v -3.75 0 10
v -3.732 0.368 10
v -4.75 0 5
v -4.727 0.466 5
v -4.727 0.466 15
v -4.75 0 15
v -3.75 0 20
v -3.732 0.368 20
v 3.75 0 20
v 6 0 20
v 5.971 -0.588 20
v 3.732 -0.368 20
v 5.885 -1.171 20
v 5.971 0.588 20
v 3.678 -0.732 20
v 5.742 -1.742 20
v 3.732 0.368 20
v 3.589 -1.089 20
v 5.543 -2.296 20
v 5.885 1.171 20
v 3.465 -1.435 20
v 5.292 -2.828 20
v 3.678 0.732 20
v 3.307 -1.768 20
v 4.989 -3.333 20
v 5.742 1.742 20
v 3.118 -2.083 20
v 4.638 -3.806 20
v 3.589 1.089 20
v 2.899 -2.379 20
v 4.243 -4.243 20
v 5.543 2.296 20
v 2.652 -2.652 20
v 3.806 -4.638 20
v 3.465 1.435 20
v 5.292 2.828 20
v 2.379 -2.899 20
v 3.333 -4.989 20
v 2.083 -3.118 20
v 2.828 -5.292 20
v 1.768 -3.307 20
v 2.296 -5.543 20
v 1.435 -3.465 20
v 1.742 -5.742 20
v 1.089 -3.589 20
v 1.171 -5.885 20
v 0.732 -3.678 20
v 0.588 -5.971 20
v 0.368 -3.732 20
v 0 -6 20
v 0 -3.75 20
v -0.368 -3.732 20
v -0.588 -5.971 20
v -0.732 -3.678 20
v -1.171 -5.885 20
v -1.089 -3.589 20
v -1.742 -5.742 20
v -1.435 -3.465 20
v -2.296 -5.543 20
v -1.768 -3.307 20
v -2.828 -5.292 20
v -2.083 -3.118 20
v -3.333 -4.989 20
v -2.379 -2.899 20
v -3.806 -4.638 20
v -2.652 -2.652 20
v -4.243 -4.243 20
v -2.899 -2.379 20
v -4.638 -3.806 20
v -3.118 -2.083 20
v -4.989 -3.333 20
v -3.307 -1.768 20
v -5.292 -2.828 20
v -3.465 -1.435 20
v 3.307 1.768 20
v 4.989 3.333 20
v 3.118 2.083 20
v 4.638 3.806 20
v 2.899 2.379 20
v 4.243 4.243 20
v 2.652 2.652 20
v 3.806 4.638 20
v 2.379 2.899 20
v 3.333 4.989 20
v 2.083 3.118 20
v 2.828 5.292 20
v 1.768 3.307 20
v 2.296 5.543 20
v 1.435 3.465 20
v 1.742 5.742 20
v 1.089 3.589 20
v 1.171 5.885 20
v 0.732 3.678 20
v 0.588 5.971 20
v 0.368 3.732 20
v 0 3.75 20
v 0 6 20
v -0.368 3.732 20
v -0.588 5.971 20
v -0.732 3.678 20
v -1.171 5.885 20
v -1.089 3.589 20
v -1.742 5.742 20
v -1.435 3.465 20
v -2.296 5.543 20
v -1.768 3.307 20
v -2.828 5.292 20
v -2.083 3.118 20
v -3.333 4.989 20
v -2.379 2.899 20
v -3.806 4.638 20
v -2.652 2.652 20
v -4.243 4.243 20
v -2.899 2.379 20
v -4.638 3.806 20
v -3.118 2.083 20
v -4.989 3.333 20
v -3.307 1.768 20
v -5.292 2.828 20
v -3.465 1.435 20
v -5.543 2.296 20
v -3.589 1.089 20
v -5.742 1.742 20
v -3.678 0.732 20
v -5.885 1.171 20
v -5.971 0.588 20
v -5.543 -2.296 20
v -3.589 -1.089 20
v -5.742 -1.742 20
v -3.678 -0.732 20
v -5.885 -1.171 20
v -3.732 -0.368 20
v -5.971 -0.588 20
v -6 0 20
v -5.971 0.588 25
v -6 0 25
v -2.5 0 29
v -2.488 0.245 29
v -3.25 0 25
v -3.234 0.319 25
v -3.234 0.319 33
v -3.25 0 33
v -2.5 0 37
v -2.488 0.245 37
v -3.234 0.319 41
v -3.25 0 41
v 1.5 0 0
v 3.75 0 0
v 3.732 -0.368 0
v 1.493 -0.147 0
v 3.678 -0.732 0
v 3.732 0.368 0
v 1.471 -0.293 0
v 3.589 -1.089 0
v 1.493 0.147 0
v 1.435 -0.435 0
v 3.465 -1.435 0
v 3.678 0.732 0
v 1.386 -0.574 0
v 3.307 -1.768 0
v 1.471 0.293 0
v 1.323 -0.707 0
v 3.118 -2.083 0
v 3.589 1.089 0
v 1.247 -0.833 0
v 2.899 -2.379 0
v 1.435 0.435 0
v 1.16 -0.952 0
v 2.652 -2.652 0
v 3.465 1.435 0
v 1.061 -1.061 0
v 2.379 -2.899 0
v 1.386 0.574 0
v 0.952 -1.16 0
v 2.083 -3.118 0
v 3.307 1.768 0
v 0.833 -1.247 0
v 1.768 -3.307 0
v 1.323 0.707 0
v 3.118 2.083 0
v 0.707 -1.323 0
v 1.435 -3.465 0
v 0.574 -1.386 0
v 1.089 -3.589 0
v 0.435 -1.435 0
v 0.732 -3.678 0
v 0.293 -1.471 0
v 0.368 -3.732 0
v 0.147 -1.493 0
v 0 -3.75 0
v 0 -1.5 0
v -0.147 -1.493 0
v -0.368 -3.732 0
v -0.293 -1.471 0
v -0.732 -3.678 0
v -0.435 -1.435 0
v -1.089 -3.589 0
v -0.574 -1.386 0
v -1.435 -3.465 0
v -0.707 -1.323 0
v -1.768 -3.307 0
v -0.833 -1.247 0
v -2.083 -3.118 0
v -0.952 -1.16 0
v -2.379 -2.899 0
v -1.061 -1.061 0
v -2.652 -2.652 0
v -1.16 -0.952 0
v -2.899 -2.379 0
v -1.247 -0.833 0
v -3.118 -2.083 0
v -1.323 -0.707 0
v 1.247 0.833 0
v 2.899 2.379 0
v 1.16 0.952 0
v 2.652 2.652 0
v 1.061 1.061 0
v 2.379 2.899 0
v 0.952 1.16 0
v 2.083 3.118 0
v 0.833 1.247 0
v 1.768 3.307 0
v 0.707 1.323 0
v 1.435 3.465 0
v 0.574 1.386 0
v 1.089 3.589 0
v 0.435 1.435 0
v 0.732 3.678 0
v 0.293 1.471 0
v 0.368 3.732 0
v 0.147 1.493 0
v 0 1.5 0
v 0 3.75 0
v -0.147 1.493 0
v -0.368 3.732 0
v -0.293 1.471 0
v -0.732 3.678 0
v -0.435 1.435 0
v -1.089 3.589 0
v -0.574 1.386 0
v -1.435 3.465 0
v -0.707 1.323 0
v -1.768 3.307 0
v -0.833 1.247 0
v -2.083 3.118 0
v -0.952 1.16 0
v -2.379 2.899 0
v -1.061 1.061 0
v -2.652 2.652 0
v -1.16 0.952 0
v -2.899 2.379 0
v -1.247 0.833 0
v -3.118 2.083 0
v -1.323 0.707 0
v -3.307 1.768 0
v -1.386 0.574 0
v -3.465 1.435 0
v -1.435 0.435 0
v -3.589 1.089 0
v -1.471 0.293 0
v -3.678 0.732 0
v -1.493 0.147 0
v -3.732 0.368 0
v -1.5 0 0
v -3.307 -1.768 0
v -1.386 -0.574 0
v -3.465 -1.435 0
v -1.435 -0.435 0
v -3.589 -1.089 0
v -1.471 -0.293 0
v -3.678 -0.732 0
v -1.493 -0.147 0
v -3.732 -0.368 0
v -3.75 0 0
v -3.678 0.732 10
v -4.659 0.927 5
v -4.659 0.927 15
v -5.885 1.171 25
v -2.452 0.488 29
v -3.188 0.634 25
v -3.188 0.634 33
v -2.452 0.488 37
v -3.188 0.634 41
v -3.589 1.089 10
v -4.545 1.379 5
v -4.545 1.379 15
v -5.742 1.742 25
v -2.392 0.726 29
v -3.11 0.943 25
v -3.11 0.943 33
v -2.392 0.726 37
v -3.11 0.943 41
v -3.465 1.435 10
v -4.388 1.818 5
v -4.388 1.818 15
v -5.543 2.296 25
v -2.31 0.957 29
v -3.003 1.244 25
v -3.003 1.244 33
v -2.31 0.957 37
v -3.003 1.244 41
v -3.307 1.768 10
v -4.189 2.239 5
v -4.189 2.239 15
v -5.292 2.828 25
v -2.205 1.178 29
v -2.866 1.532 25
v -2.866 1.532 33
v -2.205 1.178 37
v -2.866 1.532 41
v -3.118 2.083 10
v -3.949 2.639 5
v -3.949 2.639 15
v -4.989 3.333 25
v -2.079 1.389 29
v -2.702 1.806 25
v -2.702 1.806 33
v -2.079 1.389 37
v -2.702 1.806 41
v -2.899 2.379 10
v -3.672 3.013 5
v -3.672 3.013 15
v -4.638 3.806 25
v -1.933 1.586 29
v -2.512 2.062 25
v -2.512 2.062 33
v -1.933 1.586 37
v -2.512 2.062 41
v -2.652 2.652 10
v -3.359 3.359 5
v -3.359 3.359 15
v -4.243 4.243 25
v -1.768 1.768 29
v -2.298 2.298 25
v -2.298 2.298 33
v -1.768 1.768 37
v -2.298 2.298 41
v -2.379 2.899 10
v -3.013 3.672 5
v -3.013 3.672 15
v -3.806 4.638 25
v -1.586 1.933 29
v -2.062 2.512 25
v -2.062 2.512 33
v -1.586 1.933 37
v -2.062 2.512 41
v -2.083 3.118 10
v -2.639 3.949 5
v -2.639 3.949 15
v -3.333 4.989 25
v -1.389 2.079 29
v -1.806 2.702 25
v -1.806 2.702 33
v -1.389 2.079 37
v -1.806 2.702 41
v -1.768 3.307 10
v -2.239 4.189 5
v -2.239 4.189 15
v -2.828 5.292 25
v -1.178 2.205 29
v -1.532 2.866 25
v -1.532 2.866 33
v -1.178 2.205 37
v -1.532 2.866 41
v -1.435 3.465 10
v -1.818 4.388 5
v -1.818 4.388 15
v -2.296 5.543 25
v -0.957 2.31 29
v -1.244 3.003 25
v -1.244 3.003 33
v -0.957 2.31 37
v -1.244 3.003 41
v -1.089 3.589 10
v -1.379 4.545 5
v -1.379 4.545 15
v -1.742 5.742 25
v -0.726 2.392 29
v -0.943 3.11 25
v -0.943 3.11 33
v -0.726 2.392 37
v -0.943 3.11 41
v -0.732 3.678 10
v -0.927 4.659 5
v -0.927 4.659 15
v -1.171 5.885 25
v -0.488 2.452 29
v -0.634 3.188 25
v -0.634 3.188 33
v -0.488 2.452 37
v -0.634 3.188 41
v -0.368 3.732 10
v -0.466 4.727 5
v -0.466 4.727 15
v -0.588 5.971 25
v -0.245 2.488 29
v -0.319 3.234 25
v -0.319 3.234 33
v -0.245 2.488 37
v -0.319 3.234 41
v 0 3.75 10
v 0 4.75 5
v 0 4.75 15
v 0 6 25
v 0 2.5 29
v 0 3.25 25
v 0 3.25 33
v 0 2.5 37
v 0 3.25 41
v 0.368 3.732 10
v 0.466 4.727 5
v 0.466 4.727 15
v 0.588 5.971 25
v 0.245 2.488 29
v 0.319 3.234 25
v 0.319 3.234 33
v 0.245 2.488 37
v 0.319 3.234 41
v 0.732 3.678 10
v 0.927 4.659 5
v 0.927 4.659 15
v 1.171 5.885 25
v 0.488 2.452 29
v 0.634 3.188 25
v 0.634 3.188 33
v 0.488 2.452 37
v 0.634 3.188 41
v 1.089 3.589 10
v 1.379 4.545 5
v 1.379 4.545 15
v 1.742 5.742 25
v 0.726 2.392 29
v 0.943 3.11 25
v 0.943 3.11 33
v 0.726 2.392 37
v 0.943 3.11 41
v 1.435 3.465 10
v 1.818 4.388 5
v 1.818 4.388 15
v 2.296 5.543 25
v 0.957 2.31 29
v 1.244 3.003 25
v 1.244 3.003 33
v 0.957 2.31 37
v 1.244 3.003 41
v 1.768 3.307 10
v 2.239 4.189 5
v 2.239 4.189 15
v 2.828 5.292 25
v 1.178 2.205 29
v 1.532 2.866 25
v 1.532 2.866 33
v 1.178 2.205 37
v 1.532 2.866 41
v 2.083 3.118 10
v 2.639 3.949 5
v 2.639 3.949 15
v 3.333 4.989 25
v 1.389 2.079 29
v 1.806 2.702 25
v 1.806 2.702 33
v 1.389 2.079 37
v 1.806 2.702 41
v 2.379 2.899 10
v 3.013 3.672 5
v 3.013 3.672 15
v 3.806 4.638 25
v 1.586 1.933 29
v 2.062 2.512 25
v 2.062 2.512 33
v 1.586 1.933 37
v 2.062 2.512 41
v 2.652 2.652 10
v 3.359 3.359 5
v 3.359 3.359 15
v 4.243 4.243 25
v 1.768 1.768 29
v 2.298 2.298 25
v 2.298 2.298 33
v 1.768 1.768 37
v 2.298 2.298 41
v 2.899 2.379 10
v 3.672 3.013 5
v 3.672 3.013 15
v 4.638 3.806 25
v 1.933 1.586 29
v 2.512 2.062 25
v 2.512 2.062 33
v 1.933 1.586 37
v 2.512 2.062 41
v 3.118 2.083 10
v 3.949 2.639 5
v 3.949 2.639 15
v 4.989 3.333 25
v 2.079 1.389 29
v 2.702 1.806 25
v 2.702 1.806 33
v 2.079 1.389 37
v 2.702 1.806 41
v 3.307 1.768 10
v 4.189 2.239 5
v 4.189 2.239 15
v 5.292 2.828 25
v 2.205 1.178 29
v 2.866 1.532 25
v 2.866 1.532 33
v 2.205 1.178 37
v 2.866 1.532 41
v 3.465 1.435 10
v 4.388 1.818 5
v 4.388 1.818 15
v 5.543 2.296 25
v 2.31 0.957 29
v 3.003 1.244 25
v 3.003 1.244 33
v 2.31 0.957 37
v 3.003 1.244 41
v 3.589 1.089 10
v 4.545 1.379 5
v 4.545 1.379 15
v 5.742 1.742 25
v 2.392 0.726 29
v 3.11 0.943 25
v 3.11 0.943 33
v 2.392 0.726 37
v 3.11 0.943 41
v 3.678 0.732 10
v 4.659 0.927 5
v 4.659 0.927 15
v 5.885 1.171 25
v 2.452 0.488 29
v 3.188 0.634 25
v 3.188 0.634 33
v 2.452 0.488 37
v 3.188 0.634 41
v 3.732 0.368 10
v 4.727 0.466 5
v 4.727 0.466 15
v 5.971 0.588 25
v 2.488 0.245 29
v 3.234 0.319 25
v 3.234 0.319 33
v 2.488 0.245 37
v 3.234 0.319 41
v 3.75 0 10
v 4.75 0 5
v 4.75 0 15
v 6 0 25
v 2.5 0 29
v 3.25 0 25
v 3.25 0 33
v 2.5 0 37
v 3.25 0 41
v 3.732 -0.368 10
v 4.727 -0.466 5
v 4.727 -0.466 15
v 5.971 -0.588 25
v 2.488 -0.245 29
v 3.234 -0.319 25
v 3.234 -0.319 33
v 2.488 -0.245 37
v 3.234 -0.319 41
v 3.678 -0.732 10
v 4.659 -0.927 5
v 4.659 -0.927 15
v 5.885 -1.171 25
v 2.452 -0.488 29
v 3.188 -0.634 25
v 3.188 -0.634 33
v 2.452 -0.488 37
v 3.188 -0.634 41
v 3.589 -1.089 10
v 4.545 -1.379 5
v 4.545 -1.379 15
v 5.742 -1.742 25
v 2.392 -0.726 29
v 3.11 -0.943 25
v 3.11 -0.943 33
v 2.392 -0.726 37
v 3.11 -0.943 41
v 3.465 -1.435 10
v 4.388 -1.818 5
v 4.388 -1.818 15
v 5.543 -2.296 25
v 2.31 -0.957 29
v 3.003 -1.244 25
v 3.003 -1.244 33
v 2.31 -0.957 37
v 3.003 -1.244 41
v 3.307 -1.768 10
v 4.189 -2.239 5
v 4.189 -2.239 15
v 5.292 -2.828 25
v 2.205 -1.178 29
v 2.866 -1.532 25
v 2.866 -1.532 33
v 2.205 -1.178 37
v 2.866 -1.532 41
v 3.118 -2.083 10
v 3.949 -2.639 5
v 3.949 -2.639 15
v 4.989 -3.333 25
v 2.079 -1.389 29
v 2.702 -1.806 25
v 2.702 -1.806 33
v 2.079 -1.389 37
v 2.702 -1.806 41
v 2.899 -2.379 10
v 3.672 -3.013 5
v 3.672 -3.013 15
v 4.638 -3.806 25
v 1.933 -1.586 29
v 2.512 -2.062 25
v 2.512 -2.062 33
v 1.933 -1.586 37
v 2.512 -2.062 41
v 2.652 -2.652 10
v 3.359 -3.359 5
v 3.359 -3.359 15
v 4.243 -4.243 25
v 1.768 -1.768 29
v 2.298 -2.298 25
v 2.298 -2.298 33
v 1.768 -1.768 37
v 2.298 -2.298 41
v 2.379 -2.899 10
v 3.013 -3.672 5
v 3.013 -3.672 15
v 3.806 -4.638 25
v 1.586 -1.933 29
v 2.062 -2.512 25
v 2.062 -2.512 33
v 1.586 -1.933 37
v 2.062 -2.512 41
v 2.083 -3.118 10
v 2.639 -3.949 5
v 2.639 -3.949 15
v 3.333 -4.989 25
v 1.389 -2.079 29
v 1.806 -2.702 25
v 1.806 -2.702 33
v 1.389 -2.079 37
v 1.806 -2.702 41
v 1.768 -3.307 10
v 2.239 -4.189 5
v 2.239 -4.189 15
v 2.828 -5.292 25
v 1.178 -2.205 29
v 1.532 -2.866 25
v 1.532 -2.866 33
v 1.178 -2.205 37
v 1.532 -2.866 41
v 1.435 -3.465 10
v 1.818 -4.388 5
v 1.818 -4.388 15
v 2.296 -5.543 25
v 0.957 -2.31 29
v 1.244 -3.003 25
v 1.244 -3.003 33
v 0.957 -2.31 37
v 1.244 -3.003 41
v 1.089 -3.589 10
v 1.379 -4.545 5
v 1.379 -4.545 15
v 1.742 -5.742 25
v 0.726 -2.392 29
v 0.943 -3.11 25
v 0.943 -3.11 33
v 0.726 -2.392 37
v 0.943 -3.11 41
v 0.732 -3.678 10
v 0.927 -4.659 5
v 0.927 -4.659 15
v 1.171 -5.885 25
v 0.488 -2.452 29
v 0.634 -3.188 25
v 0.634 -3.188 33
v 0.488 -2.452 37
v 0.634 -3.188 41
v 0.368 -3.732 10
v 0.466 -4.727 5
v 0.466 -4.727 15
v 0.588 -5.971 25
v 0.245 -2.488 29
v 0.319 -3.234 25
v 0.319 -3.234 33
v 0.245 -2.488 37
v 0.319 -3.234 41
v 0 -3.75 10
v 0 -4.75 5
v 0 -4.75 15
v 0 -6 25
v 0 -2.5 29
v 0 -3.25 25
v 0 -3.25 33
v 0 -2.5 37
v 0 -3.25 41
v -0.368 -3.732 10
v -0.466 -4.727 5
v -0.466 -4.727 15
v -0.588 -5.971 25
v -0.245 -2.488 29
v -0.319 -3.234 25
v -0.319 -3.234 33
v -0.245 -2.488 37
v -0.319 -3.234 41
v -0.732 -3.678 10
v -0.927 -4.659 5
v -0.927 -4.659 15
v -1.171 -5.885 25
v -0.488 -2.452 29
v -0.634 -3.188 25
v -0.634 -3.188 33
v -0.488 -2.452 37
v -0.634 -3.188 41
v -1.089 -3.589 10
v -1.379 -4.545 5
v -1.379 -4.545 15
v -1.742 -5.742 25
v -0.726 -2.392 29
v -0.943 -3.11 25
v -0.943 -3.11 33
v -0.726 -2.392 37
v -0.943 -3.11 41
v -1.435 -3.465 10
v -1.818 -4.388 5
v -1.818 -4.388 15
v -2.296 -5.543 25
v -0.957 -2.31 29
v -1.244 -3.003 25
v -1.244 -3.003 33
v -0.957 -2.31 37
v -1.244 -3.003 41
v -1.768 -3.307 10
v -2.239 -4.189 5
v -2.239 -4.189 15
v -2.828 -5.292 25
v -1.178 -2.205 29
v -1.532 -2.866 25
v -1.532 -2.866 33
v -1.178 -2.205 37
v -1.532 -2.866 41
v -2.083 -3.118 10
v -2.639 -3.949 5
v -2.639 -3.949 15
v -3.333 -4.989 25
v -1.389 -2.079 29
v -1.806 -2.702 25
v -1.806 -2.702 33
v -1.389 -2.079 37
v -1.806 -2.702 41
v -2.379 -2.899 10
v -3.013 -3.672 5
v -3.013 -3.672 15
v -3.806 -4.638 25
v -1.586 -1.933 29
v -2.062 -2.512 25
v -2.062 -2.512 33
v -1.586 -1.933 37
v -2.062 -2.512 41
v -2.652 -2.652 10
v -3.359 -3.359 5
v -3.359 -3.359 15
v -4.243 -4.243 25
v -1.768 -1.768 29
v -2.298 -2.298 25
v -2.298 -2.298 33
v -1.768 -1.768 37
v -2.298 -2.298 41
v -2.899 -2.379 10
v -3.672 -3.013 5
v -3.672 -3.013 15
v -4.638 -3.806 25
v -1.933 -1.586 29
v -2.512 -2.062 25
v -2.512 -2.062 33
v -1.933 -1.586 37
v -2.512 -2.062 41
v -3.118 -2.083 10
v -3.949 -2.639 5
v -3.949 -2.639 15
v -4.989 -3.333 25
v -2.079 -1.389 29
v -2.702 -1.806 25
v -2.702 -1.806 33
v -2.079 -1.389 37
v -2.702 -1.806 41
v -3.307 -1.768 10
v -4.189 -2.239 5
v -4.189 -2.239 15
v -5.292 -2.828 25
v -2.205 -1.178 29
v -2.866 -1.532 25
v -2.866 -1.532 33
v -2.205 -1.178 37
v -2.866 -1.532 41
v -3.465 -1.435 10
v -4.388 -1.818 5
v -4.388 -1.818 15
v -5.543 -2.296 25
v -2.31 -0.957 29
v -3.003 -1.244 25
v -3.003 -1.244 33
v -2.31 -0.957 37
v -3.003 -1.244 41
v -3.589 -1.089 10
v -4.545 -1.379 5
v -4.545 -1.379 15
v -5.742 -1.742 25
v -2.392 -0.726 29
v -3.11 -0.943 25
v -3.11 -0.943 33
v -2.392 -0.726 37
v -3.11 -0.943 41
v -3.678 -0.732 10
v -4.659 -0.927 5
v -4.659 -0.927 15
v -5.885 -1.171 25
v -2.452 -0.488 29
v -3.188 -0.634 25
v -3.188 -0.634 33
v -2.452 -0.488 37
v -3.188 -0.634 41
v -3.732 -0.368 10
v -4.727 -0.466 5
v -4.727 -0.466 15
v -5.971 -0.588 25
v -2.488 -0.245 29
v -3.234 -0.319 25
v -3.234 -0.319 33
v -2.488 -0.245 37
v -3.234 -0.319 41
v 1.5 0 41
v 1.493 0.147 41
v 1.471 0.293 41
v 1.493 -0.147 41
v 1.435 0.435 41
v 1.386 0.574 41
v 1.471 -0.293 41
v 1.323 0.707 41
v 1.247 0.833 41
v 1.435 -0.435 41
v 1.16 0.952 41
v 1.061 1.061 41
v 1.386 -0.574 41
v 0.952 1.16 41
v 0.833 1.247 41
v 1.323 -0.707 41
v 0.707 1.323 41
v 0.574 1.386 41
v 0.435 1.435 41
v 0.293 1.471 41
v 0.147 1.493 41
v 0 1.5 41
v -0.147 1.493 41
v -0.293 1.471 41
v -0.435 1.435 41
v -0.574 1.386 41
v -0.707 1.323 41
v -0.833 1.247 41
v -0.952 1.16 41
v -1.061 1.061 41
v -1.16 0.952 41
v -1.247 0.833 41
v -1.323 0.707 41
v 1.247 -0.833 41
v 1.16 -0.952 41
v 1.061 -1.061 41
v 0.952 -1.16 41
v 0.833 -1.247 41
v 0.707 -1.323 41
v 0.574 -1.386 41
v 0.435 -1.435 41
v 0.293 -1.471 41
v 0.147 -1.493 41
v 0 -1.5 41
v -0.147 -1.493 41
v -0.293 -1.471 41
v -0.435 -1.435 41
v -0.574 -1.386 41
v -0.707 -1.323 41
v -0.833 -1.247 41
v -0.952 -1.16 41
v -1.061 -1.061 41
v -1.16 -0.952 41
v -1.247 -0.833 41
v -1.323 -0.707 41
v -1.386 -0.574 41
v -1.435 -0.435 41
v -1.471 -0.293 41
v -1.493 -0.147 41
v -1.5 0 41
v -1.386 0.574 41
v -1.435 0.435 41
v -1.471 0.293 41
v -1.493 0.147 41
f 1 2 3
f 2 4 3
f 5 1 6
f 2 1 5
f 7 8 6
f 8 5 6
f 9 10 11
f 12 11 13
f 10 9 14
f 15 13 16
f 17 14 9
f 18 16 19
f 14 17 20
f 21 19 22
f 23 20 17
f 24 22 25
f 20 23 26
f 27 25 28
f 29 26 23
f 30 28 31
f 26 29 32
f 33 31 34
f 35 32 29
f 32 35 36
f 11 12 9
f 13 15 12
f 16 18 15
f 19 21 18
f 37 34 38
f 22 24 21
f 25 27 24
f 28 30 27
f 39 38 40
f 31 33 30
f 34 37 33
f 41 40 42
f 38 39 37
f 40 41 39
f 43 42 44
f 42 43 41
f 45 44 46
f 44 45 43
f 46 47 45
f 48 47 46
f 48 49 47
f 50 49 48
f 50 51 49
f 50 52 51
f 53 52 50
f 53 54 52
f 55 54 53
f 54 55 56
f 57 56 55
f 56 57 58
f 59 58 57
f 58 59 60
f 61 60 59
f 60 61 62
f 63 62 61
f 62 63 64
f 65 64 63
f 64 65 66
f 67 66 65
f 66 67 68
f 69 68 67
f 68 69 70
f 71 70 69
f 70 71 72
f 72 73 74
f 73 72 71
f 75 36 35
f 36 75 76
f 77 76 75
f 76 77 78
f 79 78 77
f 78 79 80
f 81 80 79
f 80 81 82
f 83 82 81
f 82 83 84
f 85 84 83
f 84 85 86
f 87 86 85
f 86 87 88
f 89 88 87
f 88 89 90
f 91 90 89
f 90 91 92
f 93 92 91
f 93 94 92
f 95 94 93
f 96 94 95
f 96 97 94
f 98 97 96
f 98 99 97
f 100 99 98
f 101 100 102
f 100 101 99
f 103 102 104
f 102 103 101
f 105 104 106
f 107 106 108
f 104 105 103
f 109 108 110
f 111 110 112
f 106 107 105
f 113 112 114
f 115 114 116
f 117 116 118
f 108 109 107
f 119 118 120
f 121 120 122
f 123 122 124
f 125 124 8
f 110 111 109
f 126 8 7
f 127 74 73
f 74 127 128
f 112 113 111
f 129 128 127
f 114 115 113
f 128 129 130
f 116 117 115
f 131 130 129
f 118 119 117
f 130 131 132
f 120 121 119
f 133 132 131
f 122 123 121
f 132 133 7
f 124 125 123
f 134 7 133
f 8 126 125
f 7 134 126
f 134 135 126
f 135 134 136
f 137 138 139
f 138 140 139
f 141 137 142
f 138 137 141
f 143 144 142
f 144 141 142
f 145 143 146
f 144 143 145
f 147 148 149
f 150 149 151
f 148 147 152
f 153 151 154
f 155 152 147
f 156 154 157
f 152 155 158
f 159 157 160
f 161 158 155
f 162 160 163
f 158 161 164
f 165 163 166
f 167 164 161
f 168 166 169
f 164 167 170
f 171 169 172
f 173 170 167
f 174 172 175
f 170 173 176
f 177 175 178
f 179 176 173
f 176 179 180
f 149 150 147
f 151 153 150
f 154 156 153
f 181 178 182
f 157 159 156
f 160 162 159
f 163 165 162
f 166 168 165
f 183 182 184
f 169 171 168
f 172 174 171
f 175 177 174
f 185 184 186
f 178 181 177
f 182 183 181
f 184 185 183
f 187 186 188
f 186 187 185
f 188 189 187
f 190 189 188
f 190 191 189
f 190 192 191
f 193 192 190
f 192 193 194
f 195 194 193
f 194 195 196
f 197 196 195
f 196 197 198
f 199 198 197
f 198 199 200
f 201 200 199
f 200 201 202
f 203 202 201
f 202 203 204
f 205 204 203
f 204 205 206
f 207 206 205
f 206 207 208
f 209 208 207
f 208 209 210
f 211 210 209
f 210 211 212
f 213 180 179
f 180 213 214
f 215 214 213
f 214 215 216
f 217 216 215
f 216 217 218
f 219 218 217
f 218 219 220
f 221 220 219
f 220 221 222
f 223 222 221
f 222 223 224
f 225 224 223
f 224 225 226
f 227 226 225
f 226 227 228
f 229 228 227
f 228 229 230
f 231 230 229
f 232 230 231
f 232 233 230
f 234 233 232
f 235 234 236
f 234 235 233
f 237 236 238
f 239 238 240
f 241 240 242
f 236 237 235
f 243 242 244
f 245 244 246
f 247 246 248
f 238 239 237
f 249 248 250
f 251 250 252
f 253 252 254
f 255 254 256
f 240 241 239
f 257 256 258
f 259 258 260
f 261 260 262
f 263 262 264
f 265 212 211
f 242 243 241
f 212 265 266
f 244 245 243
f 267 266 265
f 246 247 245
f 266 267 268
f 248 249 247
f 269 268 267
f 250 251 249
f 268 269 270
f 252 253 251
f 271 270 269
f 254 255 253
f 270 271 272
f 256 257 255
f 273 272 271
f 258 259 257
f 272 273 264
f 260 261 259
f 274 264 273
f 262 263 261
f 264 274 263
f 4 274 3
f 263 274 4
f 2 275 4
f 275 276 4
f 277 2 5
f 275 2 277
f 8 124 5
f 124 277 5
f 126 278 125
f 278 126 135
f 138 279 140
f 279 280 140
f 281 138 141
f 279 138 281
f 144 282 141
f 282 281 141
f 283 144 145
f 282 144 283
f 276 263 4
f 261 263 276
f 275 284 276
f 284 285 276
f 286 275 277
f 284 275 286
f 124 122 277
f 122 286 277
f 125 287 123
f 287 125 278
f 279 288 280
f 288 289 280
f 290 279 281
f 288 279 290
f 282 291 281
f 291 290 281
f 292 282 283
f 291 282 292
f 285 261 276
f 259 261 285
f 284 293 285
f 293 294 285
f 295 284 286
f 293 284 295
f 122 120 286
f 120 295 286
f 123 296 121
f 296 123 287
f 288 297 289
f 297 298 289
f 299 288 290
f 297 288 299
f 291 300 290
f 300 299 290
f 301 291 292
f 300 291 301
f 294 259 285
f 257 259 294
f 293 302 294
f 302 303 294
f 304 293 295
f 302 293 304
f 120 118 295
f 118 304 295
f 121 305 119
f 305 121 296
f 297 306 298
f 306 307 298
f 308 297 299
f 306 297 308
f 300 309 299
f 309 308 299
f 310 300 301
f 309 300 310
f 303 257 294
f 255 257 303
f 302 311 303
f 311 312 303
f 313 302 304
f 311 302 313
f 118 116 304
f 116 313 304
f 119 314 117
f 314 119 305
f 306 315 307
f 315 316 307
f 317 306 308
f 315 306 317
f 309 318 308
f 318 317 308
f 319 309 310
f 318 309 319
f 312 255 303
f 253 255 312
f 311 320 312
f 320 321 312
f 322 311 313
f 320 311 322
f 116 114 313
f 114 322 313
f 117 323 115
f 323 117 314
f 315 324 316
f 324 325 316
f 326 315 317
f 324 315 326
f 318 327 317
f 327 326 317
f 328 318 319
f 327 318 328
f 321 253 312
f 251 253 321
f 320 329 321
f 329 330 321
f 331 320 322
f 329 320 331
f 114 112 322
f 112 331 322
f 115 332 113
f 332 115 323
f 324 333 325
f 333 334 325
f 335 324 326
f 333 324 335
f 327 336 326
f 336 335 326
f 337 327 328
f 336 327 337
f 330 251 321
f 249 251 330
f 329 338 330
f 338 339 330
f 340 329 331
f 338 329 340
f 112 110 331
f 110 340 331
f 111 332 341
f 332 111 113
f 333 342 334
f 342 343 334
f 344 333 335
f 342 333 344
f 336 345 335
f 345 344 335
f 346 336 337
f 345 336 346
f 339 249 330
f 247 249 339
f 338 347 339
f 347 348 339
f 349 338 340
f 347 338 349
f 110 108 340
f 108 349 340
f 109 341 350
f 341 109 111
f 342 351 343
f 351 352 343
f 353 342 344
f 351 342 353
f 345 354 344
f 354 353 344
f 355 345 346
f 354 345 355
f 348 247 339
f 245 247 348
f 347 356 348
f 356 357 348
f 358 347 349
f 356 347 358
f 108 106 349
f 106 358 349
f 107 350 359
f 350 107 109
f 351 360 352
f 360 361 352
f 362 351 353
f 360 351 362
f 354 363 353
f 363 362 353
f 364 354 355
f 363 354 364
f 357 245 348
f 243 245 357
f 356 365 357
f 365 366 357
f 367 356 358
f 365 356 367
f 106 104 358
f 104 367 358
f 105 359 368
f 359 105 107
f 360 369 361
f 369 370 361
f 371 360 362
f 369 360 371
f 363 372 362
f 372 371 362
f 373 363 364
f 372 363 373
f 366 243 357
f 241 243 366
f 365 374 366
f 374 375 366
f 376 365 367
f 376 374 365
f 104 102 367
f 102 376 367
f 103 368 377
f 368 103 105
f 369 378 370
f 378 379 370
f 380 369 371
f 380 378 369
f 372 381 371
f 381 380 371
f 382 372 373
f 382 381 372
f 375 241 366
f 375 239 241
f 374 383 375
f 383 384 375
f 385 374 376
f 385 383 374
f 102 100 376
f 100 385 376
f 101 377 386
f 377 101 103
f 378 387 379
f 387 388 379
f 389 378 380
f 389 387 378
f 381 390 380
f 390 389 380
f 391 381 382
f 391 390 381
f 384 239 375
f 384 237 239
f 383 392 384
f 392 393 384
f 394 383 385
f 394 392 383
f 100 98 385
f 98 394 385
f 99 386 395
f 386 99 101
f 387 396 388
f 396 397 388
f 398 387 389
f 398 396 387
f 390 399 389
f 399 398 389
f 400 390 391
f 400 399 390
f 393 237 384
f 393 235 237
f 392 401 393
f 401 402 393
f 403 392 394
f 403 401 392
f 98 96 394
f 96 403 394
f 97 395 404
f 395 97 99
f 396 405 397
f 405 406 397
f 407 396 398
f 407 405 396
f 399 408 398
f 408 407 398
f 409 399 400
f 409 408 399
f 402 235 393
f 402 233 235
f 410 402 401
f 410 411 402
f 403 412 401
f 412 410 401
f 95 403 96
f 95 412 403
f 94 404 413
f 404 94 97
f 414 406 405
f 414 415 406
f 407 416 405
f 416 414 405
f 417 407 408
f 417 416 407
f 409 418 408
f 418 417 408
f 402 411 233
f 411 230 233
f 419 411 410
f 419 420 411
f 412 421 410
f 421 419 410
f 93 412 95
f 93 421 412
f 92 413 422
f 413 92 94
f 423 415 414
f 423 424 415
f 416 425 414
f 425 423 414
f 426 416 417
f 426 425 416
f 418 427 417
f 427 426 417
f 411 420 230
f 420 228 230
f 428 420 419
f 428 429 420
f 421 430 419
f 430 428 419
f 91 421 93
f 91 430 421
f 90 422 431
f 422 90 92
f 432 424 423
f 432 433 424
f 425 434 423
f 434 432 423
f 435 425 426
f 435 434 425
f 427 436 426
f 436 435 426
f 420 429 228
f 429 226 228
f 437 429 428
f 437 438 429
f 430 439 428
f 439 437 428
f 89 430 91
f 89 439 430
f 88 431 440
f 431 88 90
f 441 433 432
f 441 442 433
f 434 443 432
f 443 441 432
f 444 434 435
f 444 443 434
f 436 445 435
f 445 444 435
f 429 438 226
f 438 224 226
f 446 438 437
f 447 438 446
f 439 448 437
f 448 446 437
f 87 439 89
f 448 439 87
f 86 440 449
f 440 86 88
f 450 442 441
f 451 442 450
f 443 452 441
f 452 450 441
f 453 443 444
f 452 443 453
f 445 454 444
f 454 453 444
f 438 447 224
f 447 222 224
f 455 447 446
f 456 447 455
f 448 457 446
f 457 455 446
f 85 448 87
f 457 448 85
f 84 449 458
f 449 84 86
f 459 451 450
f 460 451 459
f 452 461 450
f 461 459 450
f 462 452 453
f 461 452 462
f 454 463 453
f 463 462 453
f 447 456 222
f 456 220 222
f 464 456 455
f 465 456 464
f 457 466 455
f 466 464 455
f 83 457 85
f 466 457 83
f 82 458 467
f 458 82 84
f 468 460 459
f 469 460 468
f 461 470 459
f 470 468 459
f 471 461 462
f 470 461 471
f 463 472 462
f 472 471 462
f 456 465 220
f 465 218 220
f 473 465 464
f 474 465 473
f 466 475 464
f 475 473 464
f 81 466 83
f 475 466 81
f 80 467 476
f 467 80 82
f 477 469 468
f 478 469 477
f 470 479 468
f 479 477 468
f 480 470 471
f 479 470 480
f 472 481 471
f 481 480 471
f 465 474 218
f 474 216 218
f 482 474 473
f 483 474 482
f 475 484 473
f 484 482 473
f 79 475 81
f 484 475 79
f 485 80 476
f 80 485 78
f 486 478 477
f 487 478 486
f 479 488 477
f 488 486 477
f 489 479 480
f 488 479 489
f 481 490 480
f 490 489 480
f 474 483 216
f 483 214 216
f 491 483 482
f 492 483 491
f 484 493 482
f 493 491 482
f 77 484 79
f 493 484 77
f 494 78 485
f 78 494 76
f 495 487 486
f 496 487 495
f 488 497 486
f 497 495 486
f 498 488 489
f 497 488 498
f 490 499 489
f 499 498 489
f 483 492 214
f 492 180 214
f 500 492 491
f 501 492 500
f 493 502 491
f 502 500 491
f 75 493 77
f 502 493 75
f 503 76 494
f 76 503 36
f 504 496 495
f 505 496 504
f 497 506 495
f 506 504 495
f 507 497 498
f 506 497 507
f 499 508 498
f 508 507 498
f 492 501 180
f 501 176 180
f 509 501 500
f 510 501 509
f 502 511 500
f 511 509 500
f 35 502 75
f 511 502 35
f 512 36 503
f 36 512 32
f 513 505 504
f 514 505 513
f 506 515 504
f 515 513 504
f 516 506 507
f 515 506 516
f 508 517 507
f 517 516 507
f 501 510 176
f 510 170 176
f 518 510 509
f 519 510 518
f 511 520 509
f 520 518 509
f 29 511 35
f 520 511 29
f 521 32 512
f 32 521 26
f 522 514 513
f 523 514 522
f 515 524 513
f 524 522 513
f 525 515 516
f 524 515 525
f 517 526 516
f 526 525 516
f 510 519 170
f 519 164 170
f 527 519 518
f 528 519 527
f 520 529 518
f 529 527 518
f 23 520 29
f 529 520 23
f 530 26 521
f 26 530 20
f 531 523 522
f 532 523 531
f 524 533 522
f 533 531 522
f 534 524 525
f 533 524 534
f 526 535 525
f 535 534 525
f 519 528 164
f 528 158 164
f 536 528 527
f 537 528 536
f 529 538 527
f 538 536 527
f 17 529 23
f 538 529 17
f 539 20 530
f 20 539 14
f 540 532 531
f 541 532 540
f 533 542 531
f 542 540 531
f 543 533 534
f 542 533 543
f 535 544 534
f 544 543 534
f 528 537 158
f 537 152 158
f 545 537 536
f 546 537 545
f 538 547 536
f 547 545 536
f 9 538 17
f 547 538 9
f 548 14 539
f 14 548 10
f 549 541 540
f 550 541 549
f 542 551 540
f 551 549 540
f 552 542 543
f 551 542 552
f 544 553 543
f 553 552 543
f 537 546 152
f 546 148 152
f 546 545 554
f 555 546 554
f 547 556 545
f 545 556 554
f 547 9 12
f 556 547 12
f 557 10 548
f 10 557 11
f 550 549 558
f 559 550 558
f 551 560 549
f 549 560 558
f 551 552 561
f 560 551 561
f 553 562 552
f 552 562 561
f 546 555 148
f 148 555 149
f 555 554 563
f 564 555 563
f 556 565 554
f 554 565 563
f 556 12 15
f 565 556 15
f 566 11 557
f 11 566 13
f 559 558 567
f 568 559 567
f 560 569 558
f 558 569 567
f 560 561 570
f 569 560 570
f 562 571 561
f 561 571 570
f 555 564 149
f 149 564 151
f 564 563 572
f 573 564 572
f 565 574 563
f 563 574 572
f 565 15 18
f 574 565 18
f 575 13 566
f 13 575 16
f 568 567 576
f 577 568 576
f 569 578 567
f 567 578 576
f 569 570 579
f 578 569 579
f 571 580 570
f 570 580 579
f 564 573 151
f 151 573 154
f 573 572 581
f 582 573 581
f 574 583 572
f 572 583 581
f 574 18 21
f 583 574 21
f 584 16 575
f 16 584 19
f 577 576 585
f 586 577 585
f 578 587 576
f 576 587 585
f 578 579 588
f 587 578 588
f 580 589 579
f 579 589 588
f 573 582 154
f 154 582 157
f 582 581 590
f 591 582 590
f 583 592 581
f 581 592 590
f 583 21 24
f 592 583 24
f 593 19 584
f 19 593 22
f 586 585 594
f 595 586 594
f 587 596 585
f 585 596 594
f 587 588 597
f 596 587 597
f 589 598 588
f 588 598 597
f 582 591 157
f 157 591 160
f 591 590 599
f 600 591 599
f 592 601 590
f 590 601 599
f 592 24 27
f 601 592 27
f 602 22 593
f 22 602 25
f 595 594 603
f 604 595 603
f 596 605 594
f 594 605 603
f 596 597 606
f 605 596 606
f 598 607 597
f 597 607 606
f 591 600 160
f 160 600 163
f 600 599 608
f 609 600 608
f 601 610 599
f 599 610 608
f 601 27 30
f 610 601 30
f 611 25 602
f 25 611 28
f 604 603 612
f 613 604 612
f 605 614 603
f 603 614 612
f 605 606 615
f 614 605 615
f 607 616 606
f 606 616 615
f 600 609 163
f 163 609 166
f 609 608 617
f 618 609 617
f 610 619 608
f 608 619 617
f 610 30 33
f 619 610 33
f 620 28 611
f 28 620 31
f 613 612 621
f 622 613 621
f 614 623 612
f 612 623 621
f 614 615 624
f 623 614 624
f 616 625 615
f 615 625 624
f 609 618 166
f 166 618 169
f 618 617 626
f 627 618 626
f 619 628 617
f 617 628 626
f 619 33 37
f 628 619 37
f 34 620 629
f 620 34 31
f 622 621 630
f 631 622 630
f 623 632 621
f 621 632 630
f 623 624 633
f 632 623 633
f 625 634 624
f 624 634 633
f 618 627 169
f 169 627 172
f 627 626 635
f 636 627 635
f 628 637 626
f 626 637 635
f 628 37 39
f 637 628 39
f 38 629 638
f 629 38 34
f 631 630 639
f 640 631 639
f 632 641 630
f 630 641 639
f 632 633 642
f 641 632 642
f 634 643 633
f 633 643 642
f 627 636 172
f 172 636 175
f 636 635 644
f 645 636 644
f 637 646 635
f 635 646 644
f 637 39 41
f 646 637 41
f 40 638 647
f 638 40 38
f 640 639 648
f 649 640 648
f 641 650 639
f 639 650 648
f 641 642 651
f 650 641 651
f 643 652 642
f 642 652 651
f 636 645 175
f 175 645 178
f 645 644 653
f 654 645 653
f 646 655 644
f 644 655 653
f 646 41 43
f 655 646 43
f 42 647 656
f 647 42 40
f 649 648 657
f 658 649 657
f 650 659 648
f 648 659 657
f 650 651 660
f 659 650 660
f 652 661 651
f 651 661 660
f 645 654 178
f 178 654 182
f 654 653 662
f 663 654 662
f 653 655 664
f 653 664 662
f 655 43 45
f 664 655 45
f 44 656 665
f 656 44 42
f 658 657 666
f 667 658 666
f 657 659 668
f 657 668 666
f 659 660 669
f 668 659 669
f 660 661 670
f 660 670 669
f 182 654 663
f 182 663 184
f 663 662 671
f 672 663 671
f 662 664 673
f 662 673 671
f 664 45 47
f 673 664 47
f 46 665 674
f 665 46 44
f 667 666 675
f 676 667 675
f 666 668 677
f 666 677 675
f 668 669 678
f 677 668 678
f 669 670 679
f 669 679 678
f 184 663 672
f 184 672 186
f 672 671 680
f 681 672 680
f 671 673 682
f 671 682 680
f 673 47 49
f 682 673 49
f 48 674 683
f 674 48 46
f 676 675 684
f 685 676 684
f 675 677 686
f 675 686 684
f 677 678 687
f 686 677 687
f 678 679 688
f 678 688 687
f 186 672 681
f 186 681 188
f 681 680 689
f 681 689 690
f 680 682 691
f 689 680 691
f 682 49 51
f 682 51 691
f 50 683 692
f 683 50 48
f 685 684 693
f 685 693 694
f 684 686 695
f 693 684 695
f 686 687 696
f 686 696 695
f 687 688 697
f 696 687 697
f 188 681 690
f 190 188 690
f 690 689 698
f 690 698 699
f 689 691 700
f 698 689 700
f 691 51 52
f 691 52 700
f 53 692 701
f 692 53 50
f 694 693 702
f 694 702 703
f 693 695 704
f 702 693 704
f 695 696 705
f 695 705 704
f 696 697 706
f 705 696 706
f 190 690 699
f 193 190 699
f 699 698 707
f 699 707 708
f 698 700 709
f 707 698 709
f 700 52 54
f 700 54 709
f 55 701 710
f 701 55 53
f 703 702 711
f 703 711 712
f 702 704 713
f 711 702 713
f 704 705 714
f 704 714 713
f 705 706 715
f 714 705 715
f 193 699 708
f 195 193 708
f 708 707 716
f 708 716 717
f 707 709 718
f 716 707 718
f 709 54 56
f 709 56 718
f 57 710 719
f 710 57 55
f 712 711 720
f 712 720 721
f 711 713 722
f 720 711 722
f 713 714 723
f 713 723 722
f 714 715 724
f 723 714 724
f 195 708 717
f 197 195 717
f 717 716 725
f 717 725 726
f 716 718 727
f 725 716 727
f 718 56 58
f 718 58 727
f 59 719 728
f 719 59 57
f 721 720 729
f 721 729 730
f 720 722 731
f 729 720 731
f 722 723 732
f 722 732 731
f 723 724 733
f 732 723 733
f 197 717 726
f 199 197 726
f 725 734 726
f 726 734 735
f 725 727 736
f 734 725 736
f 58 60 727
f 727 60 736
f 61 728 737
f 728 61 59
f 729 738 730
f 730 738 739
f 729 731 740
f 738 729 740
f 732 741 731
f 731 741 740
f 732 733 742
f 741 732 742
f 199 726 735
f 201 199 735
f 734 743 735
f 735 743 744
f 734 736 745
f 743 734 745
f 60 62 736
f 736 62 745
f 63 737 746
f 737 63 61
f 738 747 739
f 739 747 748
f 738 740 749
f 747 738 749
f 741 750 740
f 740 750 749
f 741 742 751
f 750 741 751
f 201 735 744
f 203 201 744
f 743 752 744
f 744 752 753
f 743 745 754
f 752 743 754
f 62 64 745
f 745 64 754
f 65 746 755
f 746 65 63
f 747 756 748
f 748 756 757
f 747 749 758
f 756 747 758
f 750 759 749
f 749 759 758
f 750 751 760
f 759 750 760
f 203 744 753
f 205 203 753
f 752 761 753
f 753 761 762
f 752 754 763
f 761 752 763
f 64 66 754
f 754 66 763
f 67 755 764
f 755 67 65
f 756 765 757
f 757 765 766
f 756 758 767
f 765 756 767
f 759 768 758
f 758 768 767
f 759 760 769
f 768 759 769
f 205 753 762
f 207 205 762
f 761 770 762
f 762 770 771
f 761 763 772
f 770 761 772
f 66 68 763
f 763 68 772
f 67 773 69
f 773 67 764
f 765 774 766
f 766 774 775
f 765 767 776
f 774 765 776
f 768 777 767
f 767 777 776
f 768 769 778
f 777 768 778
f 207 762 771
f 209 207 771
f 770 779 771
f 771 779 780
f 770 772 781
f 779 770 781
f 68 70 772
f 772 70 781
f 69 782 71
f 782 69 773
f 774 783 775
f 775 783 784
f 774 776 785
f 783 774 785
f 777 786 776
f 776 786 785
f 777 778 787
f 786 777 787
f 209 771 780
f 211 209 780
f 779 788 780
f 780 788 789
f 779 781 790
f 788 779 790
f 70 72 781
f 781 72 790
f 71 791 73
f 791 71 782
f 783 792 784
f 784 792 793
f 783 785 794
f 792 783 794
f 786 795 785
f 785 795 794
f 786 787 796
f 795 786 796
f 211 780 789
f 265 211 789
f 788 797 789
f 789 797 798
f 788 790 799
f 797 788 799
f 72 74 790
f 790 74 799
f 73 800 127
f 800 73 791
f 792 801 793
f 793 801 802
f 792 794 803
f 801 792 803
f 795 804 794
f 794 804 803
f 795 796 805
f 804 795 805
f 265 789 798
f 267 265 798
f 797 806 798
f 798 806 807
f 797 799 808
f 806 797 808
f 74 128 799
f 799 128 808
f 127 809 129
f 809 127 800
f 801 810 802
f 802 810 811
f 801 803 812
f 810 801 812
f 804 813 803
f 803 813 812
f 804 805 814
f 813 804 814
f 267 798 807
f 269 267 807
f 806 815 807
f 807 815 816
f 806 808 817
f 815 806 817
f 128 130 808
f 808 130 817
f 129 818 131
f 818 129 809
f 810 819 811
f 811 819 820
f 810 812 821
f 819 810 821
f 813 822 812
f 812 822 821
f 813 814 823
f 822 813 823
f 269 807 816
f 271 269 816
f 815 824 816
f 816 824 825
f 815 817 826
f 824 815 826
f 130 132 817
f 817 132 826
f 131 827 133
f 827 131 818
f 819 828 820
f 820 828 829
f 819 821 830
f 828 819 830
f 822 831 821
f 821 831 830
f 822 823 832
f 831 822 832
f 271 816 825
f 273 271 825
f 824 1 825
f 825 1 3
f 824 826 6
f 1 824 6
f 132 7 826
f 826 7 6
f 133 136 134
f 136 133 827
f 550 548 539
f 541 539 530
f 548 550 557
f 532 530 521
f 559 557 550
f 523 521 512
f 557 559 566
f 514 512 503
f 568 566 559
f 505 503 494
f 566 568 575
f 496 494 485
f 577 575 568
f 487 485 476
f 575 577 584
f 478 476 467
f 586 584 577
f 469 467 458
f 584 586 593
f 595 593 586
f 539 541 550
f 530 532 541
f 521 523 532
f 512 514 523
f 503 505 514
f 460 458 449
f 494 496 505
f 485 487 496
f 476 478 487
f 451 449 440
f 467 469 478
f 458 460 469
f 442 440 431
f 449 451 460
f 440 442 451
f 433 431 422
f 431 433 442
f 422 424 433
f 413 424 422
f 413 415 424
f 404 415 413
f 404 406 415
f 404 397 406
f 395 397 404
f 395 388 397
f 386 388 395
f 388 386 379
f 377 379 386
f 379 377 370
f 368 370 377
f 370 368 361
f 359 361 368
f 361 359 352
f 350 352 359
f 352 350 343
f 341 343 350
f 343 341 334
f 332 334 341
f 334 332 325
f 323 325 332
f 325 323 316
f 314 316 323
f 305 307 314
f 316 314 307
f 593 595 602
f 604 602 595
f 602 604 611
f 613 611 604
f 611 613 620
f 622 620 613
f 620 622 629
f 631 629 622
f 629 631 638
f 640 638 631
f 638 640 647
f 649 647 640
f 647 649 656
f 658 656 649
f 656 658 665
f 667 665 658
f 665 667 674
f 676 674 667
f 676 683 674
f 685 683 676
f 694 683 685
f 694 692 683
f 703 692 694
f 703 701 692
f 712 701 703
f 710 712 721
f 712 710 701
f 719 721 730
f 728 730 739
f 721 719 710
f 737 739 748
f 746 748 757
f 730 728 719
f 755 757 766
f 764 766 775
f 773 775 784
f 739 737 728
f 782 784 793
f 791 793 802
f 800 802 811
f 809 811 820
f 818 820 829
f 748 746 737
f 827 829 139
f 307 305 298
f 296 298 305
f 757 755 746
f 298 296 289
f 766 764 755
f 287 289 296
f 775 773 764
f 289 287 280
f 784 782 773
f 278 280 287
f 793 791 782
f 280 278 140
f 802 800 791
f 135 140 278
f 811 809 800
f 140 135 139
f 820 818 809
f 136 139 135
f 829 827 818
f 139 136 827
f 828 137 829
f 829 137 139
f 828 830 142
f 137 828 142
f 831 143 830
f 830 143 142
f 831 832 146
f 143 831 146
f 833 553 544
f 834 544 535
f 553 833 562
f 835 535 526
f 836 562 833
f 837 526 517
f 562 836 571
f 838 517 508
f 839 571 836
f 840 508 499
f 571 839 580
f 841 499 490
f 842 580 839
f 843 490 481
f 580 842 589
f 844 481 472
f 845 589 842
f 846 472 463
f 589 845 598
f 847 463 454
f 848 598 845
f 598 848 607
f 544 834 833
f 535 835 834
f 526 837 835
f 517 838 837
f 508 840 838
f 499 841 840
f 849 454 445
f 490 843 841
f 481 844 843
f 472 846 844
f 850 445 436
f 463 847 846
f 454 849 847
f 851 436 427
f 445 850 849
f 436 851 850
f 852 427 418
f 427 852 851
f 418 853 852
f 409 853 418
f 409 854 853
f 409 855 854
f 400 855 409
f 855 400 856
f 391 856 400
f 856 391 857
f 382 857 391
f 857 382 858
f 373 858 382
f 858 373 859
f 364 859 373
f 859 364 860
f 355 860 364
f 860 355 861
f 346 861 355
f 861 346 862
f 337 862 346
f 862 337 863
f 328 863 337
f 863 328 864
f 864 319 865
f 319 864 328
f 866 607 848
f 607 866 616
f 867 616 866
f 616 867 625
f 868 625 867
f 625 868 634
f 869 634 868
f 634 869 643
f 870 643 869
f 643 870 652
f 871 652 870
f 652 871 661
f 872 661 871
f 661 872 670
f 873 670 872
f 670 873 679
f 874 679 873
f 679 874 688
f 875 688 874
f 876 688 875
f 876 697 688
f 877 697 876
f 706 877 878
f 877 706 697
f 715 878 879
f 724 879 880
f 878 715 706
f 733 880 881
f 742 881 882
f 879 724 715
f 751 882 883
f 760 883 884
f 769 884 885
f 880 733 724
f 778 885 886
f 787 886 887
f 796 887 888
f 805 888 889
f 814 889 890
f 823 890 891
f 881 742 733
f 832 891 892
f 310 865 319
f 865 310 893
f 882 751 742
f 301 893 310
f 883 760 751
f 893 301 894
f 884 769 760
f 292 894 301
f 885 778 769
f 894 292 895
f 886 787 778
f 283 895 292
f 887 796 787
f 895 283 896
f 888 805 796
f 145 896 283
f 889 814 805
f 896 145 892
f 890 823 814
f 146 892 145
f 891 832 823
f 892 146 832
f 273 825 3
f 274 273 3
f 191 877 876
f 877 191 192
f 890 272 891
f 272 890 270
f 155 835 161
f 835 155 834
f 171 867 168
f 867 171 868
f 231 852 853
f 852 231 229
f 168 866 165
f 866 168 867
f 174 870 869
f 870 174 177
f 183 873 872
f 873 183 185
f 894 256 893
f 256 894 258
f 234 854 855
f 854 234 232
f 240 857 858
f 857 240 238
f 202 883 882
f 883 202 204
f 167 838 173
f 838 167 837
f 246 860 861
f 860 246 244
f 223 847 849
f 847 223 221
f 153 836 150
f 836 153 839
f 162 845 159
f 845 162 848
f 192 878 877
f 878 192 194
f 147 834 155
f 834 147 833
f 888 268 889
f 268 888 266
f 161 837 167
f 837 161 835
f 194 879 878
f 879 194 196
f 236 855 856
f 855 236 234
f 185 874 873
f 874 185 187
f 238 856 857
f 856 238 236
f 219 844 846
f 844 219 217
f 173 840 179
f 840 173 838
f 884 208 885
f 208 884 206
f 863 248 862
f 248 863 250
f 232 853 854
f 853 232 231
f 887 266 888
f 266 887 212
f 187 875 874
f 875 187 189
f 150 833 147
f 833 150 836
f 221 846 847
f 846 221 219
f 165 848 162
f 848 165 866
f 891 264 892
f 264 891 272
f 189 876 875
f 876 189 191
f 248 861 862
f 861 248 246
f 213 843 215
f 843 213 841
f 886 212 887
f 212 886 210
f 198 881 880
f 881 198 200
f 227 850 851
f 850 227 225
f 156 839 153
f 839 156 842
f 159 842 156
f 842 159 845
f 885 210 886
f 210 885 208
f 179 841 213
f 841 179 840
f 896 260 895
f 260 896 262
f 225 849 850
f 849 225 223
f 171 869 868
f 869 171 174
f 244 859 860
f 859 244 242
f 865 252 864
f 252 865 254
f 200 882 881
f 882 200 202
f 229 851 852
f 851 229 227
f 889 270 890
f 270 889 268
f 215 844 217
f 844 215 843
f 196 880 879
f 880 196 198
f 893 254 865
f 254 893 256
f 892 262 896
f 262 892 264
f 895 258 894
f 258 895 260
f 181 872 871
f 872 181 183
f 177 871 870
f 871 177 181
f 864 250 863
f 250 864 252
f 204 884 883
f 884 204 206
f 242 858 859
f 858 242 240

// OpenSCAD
// Hose Barb Connector for 8mm and 5mm silicon tubing
// Dimensions in millimeters

// 8mm tubing barb parameters
barb_8mm_height = 10;           // height of each barb
barb_8mm_base_od = 7.5;         // base outer diameter
barb_8mm_peak_od = 9.5;         // peak outer diameter
barb_8mm_base_r = barb_8mm_base_od / 2;
barb_8mm_peak_r = barb_8mm_peak_od / 2;

// 5mm tubing barb parameters
barb_5mm_height = 8;            // height of each barb
barb_5mm_base_od = 6.5;         // base outer diameter
barb_5mm_valley_od = 5.0;       // valley (minimum) outer diameter
barb_5mm_base_r = barb_5mm_base_od / 2;
barb_5mm_valley_r = barb_5mm_valley_od / 2;

// Collar between barbed sections
collar_od = 12;                 // collar outer diameter
collar_r = collar_od / 2;
collar_z_start = 20;
collar_z_end = 25;

// Central hole through entire connector
hole_od = 3;                    // hole outer diameter
hole_r = hole_od / 2;

// Total height
total_height = 41;

$fn = 64;

// 2D profile for rotate_extrude (XZ plane: X=radius, Z=height)
// Rotated 360° around Z-axis to create 3D solid
profile = [
    [0, 0],  // Center at z=0
    
    // First 8mm barb (z=0 to z=10): triangular peak
    [barb_8mm_base_r, 0],
    [barb_8mm_peak_r, barb_8mm_height / 2],
    [barb_8mm_base_r, barb_8mm_height],
    
    // Second 8mm barb (z=10 to z=20): triangular peak
    [barb_8mm_peak_r, barb_8mm_height + barb_8mm_height / 2],
    [barb_8mm_base_r, barb_8mm_height * 2],
    
    // Collar (z=20 to z=25): cylindrical section
    [collar_r, collar_z_start],
    [collar_r, collar_z_end],
    
    // First 5mm barb (z=25 to z=33): inverted triangular valley
    [barb_5mm_base_r, 25],
    [barb_5mm_valley_r, 25 + barb_5mm_height / 2],
    [barb_5mm_base_r, 25 + barb_5mm_height],
    
    // Second 5mm barb (z=33 to z=41): inverted triangular valley
    [barb_5mm_valley_r, 25 + barb_5mm_height + barb_5mm_height / 2],
    [barb_5mm_base_r, total_height],
    
    [0, total_height]  // Center at z=41
];

// Create main body and remove central hole
difference() {
    rotate_extrude() polygon(profile);
    
    // Subtract central hole
    translate([0, 0, -0.51]) cylinder(r = hole_r, h = total_height + 1.02, $fn = 64);
}
